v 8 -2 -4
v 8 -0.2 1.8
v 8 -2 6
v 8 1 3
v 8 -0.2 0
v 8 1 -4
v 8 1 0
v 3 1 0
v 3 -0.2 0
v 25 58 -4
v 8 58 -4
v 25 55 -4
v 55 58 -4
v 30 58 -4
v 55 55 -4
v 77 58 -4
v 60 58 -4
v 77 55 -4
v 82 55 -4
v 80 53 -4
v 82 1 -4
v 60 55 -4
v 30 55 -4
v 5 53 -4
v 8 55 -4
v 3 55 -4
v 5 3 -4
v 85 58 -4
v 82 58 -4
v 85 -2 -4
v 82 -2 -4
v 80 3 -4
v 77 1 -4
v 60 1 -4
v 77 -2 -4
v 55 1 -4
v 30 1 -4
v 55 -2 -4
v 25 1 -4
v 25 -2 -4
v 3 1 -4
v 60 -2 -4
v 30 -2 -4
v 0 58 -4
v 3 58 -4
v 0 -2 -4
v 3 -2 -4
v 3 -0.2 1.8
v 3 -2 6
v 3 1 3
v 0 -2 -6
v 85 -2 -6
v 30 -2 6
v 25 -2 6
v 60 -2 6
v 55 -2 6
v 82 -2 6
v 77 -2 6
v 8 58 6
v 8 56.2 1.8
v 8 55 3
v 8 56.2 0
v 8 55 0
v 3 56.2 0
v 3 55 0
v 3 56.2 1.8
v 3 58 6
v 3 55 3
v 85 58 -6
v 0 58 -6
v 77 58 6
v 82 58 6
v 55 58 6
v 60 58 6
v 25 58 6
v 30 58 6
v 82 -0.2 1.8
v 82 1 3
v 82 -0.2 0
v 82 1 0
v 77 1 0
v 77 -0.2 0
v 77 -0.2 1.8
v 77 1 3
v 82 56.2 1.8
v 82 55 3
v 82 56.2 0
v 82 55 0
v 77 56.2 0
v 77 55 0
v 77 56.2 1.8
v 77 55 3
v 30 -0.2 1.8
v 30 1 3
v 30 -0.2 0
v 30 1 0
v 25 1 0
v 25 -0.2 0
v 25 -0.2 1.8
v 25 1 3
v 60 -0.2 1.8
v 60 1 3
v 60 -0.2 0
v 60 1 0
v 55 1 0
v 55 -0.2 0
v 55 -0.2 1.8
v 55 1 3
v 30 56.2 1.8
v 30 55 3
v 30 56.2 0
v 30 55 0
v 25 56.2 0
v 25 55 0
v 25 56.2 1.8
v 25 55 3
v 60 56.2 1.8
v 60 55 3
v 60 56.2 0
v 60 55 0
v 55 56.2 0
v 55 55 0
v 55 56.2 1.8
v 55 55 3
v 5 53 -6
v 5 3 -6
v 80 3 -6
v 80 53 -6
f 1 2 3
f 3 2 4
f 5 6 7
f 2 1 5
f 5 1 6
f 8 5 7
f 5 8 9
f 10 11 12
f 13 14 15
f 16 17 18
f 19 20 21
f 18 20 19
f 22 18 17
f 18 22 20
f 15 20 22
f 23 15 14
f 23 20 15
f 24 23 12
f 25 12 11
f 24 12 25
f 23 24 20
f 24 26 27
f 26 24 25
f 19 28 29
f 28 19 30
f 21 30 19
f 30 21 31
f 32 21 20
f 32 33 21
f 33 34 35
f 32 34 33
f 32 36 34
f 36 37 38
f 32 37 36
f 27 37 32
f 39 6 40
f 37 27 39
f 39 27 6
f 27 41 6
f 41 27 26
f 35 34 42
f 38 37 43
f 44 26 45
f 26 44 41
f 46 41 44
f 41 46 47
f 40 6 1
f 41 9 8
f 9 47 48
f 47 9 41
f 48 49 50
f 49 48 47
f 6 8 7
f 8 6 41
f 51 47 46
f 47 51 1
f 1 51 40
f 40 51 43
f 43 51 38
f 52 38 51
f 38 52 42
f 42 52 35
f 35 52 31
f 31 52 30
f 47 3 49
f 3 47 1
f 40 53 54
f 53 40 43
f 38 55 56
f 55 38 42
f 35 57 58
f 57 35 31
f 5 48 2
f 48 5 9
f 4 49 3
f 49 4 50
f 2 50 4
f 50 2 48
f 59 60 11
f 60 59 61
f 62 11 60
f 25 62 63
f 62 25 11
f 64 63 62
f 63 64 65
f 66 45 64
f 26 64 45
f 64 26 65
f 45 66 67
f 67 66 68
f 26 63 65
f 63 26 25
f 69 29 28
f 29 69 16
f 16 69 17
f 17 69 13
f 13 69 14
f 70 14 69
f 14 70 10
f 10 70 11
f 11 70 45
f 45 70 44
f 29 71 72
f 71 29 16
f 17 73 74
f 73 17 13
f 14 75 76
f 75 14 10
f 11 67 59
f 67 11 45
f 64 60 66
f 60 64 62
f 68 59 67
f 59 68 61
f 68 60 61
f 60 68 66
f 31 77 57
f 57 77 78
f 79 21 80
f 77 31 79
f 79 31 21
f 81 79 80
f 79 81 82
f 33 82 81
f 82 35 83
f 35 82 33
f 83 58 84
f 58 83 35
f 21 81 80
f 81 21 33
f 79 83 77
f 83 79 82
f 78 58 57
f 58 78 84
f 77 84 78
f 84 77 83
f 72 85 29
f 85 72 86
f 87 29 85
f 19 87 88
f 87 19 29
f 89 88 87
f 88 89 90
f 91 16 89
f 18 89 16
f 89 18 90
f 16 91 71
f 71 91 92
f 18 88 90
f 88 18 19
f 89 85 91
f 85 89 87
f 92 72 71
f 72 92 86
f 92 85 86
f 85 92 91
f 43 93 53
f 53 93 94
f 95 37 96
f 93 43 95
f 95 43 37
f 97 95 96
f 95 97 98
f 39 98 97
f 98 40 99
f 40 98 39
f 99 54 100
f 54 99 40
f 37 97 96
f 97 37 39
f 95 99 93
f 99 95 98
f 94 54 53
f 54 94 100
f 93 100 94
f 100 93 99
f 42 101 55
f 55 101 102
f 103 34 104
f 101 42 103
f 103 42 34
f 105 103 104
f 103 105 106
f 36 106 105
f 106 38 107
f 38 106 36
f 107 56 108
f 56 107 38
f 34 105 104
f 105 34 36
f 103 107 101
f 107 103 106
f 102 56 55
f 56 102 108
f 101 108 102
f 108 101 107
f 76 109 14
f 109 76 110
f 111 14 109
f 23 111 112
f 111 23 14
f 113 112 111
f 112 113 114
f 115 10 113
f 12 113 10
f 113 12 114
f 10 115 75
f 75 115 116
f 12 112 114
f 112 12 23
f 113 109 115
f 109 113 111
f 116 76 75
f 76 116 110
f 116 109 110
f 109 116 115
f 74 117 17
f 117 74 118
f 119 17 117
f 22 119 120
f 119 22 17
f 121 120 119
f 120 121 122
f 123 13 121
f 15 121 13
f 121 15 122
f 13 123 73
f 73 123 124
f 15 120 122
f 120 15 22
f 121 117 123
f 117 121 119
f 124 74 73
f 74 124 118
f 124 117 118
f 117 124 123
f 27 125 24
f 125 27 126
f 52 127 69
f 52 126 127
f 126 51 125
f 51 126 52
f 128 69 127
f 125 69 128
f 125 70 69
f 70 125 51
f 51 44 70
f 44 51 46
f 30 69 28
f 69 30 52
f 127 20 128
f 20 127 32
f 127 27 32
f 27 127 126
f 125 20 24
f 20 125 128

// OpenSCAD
small = 0.1;
peg_bite  =  1.0;
bite_extra = 0.2;  // extra clearance for edge of board
peg_gap   =  2.0;
peg_width =  5.0;
peg_depth =  3.0;
peg_sep   =  56 - 2;
peg_raise =  4.0;

board_x = 85.0;
board_y = 56.0;
board_z =  1.1;

//   _
//  | \
//  |  \
//  |   \
//  |  /
//  |  |
//  |  o-|  <- origin
//  |    |
//  |    |
//  ------
module peg()
{
  extra = 1;

  translate([0, -peg_depth+peg_bite,-peg_raise])
  {
    cube([peg_width,peg_depth,peg_raise], center=false);
  }

  translate([0, -peg_depth+peg_bite,0])
  {
    cube([peg_width,peg_depth-peg_bite-bite_extra,peg_gap+peg_bite+peg_bite], center=false);
  }

  translate([0,-peg_depth+peg_bite+extra-extra,peg_gap])
  {
    //cube([peg_width,peg_depth-peg_bite-extra,peg_bite+extra], center=false);
  }

  peg_dxy = peg_depth;
  polyhedron(
    points = [
      [0, peg_bite, peg_gap+peg_bite],
      [0, peg_bite-peg_dxy, peg_gap+peg_bite-peg_dxy],
      [0, peg_bite-peg_dxy, peg_gap+peg_bite+peg_dxy],
      [peg_width, peg_bite, peg_gap+peg_bite],
      [peg_width, peg_bite-peg_dxy, peg_gap+peg_bite-peg_dxy],
      [peg_width, peg_bite-peg_dxy, peg_gap+peg_bite+peg_dxy],
    ],
    triangles = [ 
      [0,2,1],  // right
      [3,4,5],  // left
      [0,3,2],  // top
      [2,3,5],
      [1,2,4],  // back
      [4,2,5],
      [0,1,3],  // bottom
      [3,1,4]
    ]
  );
}

module front_peg(x)
{
  translate([x,0,0]) 
  {
    peg();
  }
}

module back_peg(x)
{
  translate([x,board_y,0])
  {
    mirror([0,1,0])
    {
      peg();
    }
  }
}


module board()
{
  color([0,1,0]) {
    cube([board_x,board_y,board_z],center=false);
  }
  // ethernet block
  translate([-1,37.5,board_z]) 
  {
    cube([21,16,14.0]);
    translate([-10.0+small,0,0]) cube([10.0,16,14]);  // clearance volume - keep clear
  }

  // usb block
  translate([0,18,board_z]) 
  {
    translate([-7.5,0,1]) cube([18,14,15]);
    translate([-3,2,0]) cube([13,10,1+small]);
  }

  // hdmi block
  translate([board_x-5.0,44.0,board_z])
  {
    cube([6.0,9.0,4.0]);
    translate([6.0-small,0,0]) cube([10.0,9.0,4.0]);  // clearance volume - keep clear
  }

  // SD Card clearance
  translate([board_x-small,14.0,-3.5])
  {
    cube([17.0+small, 25.0, 3.0]);  // clearance volume - keep clear
  }
}

module pair()
{
  foot_height = 2.0;
  foot_x = peg_width;
  foot_y = board_y + (peg_depth-peg_bite) * 2;
  translate([0,-peg_depth+peg_bite,-peg_raise-foot_height])
  {
    cube([foot_x,foot_y,foot_height],center=false);
  }
}

module pibase()
{
  front_peg(3.0);
  back_peg(3.0);
  front_peg(board_x-peg_width-3.0);
  back_peg(board_x-peg_width-3.0);

  pair();
  translate([board_x-peg_width,0,0])
  {
    pair();
  }

  // more pegs

  front_peg(25.0);
  front_peg(board_x-25.0-peg_width);
  back_peg(25.0);
  back_peg(board_x-25.0-peg_width);


  peg3_offet = 25.0;
  
  
  spar_width = peg_width;
  spar_height = 2.0;
  translate([0,-peg_depth+peg_bite,-peg_raise-spar_height]) {
    cube([board_x, spar_width, spar_height]);
  }
  translate([0,board_y-spar_width+peg_depth-peg_bite,-peg_raise-spar_height]) {
    cube([board_x, spar_width, spar_height]);
  }
}

pibase();
%board();
